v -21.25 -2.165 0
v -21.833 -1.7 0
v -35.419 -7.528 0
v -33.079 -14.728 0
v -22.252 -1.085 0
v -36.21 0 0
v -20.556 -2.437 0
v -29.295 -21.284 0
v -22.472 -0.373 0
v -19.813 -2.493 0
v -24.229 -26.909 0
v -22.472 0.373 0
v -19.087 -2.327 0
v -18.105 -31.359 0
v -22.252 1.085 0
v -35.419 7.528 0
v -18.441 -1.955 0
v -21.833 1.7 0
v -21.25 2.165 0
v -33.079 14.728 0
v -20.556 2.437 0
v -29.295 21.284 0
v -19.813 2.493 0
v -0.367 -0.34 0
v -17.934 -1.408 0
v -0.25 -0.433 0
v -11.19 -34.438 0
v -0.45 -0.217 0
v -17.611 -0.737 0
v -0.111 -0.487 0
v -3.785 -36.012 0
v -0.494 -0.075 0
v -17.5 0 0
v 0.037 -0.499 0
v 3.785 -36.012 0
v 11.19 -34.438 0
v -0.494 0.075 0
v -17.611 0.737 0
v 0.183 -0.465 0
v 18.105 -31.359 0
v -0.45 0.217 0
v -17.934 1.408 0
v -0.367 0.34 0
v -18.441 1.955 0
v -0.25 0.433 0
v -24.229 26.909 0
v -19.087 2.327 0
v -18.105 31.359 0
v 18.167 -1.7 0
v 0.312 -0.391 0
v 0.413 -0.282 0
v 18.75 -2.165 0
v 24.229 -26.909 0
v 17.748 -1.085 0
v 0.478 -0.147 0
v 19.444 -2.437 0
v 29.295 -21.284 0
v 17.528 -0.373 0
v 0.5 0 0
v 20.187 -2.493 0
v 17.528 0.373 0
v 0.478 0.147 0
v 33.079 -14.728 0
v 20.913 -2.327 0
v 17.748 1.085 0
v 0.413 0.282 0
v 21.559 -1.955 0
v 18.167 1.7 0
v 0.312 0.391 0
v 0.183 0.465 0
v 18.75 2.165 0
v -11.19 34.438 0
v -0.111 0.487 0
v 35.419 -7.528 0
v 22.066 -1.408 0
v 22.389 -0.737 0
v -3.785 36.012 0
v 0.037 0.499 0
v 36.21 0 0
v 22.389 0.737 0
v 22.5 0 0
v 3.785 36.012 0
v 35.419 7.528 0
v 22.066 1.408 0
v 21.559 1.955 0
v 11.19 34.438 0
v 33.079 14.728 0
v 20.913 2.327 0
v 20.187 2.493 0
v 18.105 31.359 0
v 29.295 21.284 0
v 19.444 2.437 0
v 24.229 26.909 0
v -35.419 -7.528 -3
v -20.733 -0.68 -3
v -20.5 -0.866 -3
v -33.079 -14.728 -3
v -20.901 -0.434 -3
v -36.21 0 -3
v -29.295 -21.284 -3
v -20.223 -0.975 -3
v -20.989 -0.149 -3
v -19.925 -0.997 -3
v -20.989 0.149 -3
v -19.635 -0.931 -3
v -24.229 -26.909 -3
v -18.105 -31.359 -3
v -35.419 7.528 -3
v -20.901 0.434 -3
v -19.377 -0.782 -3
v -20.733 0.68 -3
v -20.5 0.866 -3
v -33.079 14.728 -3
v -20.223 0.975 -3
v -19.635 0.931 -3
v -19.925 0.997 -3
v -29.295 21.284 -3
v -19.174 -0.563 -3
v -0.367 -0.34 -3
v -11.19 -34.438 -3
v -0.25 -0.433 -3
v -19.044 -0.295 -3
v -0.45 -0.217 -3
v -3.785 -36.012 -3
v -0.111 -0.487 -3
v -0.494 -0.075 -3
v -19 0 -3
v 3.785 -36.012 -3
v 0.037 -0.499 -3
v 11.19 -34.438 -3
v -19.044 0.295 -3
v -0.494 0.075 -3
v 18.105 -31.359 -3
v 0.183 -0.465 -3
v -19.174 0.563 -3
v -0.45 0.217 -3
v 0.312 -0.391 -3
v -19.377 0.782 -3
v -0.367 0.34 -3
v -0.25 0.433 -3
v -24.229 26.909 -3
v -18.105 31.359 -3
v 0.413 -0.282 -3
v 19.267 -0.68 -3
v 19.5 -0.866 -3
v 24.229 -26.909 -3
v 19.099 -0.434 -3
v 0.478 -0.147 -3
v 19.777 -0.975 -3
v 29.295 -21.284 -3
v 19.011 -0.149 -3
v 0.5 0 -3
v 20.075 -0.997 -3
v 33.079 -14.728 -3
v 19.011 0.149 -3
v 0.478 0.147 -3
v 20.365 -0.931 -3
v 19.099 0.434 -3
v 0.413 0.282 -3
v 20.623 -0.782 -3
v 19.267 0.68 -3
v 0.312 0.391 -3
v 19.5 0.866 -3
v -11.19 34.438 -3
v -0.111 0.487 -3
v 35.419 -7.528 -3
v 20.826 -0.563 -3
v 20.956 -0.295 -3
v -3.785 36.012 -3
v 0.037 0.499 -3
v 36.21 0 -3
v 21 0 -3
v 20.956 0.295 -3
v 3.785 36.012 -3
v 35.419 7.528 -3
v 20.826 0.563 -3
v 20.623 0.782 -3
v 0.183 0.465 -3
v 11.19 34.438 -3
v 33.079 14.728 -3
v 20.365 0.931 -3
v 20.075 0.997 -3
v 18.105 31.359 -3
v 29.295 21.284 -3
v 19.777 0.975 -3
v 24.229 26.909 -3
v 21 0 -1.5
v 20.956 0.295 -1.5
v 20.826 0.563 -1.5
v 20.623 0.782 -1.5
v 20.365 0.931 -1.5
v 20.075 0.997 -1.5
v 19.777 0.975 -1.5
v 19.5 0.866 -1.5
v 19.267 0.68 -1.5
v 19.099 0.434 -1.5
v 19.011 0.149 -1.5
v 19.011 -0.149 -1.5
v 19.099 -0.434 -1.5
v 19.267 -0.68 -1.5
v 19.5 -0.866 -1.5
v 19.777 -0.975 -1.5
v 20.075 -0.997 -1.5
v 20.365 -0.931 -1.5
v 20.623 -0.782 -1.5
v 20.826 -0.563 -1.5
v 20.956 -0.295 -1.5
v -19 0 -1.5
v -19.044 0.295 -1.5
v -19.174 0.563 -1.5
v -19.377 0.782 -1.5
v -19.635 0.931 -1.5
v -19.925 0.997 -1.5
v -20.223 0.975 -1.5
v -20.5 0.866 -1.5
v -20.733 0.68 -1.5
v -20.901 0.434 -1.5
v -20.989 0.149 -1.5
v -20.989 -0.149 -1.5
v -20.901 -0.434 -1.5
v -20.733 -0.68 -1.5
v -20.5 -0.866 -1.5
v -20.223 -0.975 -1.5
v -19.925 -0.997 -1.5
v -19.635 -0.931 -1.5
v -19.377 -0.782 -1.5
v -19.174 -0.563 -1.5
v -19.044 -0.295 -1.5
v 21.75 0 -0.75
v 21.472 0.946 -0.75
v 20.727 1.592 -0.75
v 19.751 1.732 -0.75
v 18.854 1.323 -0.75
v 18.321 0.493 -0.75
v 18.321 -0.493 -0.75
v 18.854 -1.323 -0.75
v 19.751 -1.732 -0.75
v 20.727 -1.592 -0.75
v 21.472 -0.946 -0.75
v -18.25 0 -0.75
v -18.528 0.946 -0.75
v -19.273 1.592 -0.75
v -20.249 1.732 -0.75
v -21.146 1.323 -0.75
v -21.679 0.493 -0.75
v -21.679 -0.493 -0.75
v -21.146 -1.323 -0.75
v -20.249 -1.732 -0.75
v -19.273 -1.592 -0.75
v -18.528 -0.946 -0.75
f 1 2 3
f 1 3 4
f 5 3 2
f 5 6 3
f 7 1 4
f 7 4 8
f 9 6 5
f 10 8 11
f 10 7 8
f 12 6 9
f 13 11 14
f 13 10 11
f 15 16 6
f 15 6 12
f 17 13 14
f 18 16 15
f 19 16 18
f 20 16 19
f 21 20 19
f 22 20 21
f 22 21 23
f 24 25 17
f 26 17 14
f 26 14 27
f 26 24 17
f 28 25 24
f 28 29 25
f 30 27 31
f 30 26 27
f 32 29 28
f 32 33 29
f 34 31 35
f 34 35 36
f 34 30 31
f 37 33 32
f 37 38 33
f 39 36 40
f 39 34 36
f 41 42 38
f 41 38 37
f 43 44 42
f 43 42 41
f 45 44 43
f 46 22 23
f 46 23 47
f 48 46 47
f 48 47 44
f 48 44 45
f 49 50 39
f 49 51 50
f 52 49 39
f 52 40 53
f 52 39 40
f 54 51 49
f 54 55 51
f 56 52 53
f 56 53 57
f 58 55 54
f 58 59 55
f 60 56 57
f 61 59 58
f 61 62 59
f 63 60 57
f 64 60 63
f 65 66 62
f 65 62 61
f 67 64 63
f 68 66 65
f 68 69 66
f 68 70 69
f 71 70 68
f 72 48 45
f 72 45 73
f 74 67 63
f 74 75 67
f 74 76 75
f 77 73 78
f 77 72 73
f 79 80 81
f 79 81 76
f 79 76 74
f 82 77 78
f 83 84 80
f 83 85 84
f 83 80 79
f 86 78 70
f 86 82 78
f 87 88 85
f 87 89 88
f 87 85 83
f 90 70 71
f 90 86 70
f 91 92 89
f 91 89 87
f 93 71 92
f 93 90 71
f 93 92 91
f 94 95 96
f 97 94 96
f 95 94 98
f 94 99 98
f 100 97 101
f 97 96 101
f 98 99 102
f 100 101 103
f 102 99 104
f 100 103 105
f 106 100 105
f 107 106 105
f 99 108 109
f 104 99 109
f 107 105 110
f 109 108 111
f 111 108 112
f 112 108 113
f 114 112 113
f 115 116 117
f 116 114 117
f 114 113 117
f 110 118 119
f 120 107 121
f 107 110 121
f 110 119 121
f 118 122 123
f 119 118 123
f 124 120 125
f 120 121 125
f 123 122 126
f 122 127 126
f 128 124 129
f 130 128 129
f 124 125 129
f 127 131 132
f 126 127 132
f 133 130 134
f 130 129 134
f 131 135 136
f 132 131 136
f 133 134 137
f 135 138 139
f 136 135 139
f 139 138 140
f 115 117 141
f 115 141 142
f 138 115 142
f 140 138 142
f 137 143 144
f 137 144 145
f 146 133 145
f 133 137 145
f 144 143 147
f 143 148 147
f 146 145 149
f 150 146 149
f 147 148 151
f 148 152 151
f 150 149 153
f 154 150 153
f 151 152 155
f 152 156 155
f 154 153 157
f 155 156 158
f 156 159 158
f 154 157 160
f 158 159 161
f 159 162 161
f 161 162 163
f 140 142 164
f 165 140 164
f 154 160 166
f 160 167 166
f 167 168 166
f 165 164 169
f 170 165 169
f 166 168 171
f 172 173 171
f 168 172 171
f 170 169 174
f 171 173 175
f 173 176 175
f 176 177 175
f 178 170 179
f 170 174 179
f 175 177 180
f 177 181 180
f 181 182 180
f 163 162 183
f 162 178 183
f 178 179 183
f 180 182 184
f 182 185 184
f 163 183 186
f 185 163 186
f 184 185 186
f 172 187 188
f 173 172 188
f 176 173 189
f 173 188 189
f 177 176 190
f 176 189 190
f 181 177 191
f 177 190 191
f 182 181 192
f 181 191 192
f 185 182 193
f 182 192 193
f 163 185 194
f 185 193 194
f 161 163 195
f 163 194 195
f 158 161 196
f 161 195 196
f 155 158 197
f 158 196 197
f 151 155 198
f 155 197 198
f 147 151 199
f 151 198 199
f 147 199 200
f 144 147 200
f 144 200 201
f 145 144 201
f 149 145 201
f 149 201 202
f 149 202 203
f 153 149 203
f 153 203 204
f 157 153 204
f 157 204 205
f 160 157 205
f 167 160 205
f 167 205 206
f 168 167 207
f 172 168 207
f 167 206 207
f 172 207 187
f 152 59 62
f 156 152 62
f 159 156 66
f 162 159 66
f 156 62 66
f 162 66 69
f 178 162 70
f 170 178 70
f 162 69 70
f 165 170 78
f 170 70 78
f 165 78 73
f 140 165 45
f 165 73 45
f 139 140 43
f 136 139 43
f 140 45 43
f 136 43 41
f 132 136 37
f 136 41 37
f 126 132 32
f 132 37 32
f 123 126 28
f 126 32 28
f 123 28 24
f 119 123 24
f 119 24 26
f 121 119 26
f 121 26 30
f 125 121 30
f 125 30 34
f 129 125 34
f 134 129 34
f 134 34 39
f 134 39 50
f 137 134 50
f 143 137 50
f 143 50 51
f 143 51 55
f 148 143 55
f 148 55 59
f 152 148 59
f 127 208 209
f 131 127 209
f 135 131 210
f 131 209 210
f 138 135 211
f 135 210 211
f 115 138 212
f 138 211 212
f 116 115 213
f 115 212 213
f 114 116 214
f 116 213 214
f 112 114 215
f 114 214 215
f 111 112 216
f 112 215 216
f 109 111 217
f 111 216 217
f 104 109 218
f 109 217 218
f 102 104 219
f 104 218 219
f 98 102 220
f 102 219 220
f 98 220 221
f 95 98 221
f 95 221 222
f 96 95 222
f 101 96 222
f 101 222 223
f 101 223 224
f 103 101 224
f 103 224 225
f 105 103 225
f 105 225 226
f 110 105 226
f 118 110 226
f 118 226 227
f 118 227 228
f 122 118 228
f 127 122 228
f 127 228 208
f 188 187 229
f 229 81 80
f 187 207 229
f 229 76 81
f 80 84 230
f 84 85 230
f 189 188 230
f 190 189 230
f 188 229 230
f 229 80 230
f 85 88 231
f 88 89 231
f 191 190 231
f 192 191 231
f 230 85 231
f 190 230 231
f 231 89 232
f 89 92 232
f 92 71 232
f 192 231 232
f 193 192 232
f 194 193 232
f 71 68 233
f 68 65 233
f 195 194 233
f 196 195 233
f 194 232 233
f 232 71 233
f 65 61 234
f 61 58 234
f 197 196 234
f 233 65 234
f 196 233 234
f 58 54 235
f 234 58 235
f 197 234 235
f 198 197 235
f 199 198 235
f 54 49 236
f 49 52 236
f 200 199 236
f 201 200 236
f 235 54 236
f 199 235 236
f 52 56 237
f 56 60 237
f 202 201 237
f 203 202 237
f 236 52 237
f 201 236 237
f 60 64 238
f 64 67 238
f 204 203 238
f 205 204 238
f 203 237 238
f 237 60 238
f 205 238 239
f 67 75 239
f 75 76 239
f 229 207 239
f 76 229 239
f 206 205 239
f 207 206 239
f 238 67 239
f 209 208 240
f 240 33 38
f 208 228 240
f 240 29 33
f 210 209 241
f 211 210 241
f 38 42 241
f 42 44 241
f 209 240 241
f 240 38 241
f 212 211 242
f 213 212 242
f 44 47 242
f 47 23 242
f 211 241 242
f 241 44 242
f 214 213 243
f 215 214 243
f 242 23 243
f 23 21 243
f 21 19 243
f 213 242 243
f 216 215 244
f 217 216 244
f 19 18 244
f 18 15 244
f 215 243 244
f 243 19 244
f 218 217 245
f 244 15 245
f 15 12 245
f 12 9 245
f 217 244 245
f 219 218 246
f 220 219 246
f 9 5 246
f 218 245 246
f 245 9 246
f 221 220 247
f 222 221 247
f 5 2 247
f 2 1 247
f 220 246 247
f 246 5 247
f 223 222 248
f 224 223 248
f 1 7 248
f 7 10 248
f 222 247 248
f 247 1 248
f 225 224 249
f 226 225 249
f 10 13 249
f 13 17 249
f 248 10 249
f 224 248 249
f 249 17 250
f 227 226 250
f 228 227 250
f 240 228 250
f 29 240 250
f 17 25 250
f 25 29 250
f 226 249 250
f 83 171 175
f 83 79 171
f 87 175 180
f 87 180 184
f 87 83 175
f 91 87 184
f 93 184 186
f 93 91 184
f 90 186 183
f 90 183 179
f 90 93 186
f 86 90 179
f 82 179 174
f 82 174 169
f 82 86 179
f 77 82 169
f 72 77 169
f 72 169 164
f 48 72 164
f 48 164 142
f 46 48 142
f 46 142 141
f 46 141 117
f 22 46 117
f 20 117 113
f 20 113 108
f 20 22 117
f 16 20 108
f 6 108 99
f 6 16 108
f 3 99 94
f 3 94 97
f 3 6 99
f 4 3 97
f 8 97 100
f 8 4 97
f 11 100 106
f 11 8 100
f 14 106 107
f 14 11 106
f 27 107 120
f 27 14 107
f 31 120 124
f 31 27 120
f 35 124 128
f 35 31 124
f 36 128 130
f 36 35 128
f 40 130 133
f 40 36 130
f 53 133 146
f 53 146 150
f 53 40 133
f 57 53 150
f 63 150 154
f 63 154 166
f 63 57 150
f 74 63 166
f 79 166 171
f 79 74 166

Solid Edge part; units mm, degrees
sketch "Sketch1" plane through (0, 0, 0) normal (0, 0, 1) x (1, 0, 0)
  circle A0 centre (20, 0) radius 1
  circle A1 centre (0, 0) radius 0.5
  circle A2 centre (-20, 0) radius 1
  circle A3 centre (0, 0) radius 36.21
  dimension "D1" = 72.42
  dimension "D2" = 1
  dimension "D3" = 2
  dimension "D4" = 20
  dimension "D5" = 20
extrude "Protrusion1" add sketch "Sketch1" against normal blind 3
chamfer "Chamfer_1" distance 1.5 angle 45 2 edges at (19, 0, 0) (-21, 0, 0)
